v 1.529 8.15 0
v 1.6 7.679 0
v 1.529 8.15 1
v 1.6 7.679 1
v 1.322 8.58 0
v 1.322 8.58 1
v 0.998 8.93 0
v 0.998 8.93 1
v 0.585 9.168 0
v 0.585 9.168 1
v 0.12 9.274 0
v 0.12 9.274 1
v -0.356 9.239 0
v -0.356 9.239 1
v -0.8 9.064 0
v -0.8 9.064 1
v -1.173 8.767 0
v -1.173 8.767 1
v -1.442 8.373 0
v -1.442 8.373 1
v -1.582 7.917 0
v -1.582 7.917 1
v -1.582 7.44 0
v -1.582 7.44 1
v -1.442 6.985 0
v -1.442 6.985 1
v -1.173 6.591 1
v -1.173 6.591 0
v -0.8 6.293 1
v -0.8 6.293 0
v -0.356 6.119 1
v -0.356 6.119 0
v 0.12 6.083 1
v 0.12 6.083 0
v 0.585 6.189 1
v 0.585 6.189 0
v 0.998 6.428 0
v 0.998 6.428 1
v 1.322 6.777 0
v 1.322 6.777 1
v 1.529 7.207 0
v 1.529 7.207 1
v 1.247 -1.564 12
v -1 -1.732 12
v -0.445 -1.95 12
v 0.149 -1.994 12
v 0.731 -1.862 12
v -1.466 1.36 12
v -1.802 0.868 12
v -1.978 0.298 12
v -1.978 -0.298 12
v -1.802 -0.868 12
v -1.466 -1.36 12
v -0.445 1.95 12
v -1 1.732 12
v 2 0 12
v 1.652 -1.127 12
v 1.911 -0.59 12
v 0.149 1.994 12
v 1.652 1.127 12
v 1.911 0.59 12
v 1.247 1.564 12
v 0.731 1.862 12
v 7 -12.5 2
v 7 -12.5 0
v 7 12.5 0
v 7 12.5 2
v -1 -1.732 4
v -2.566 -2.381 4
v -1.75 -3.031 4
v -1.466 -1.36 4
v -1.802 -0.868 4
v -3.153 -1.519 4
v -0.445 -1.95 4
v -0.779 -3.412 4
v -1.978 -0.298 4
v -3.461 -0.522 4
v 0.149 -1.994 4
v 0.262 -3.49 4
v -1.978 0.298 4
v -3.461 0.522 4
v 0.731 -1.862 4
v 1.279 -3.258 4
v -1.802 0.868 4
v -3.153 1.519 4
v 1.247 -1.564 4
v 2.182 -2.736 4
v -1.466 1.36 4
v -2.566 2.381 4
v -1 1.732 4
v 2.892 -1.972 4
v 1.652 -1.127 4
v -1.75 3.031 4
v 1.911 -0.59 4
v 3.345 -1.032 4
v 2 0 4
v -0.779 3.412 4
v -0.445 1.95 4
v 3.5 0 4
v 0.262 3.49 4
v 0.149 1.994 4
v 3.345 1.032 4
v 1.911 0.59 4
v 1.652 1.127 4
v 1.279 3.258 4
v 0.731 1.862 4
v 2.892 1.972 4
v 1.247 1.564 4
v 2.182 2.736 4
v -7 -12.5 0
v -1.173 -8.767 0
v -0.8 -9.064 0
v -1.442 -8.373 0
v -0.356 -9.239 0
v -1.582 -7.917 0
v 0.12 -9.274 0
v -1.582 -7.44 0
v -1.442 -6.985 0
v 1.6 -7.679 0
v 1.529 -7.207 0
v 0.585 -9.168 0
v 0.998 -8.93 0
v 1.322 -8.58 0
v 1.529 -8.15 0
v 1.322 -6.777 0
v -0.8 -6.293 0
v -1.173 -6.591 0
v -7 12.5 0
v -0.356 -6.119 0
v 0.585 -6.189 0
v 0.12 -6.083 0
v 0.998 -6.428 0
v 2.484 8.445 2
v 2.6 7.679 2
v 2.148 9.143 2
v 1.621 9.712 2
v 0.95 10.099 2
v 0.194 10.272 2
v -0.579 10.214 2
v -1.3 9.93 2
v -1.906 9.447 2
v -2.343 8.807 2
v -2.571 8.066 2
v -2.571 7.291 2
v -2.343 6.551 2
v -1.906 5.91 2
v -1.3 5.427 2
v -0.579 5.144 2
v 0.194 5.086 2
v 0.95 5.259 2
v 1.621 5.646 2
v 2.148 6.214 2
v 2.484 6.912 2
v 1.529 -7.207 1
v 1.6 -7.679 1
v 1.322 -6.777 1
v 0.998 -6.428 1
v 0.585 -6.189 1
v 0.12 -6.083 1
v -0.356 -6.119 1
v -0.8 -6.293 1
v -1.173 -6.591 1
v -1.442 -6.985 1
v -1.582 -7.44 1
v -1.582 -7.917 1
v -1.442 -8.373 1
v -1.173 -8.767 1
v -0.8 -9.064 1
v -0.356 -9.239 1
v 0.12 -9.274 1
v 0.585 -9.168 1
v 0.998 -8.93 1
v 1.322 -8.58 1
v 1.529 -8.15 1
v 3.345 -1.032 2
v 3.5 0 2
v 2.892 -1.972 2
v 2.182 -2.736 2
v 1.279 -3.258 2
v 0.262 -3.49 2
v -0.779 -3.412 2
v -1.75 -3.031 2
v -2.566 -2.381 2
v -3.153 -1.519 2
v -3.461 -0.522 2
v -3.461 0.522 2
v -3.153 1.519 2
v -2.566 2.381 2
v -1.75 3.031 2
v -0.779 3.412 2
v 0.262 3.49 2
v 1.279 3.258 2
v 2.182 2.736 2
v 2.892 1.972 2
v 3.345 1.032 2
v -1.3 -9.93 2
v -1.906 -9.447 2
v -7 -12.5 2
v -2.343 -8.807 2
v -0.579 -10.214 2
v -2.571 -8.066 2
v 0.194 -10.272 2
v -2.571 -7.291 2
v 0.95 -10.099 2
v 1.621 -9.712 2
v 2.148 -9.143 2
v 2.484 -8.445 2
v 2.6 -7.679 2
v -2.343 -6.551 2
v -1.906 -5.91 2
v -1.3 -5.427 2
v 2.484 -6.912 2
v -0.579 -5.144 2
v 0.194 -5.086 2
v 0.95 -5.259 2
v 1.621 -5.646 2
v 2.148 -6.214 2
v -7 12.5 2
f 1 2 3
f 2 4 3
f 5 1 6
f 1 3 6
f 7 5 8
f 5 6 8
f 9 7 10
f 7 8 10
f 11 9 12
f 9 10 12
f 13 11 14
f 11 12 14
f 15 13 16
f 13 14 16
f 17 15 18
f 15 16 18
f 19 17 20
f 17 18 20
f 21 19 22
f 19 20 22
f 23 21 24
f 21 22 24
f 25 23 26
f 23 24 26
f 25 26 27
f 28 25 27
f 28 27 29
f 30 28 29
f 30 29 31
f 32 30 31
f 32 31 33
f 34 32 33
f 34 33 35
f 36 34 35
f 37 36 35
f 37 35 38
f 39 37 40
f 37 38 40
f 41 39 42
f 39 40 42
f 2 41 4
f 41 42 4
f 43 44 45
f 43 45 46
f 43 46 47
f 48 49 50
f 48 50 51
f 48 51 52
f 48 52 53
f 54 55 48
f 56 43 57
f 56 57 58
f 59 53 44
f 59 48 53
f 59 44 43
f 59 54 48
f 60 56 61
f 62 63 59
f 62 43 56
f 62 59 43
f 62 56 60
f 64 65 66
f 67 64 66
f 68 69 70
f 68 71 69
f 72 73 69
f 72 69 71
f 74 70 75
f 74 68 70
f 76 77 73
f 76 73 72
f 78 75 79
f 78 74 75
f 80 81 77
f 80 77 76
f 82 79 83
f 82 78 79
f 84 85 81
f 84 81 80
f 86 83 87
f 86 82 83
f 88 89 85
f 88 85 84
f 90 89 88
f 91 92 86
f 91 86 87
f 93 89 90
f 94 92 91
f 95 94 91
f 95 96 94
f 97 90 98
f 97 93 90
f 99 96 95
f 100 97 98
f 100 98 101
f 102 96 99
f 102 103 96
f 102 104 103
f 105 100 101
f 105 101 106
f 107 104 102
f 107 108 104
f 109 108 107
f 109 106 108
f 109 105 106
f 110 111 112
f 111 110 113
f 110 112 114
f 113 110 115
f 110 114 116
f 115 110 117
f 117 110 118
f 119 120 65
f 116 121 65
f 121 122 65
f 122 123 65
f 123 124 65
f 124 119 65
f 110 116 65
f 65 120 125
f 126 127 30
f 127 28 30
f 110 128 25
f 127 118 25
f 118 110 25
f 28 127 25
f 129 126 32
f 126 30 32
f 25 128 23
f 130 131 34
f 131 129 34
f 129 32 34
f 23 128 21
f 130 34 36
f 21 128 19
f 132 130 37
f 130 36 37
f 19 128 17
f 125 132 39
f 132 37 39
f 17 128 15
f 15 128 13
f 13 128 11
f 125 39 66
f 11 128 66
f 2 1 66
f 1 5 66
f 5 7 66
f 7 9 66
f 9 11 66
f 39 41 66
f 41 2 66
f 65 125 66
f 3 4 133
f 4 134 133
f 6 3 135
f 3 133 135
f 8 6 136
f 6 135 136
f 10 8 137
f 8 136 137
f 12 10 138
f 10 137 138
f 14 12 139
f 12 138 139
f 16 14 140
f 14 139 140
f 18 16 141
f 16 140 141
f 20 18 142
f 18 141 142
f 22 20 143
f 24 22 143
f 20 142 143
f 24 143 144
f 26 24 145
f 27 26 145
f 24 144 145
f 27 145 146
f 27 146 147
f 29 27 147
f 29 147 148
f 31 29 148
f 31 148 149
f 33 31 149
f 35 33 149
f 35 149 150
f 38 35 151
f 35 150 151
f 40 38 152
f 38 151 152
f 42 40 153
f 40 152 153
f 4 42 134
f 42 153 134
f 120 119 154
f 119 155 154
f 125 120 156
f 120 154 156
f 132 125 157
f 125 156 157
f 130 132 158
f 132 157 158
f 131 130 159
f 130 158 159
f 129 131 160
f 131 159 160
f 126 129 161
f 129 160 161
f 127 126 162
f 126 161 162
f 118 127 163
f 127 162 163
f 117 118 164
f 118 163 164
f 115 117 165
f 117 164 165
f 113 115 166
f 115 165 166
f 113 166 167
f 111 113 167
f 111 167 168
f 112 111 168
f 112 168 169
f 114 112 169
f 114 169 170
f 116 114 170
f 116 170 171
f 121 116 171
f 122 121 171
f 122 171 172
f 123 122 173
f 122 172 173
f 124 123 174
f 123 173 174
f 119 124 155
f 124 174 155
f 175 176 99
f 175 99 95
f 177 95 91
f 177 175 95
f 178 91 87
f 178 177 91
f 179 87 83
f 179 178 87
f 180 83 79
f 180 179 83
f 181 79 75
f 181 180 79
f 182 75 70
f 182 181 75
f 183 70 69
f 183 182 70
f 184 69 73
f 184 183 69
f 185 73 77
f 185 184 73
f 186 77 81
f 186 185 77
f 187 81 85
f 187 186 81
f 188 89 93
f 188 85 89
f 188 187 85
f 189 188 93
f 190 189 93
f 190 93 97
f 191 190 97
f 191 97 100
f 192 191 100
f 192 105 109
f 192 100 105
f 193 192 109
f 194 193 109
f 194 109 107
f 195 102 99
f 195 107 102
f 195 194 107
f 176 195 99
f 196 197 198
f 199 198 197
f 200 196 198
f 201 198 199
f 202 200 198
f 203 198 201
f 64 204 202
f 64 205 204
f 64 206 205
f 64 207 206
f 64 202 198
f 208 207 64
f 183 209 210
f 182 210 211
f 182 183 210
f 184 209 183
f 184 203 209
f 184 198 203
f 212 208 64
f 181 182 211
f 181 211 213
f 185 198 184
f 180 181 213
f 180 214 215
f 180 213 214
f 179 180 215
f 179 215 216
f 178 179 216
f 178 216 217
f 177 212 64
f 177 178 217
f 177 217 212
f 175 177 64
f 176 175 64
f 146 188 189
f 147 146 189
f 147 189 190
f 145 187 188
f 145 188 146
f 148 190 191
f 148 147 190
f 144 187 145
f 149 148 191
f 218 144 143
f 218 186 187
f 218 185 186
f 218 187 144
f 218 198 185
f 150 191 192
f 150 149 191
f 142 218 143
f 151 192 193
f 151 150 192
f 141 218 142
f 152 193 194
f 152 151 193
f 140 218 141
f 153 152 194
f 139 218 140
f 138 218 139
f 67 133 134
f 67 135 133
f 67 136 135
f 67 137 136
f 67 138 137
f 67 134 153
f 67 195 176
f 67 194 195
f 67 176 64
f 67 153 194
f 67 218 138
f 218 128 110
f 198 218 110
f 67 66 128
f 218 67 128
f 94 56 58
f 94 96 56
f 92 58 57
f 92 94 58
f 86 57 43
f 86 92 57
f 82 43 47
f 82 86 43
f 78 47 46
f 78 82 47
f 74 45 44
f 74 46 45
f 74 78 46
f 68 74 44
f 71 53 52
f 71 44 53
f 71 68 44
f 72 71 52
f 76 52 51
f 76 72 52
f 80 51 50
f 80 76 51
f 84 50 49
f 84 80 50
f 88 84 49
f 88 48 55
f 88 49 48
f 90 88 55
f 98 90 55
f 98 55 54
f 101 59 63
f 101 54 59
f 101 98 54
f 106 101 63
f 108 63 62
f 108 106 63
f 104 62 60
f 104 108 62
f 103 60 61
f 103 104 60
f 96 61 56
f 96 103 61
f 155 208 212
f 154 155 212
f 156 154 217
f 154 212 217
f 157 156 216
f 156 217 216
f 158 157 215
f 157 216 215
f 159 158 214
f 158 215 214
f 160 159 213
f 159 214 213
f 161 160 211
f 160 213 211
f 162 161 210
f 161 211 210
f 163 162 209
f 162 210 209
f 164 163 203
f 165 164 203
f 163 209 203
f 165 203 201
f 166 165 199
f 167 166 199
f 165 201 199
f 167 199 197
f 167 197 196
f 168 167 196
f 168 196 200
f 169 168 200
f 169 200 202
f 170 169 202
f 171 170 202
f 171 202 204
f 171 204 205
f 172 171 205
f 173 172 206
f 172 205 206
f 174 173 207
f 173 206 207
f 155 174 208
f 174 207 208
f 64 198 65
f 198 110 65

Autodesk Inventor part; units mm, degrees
ref_plane "YZ Plane" through (0, 0, 0) normal (1, 0, 0) x (0, 1, 0)
ref_plane "XZ Plane" through (0, 0, 0) normal (0, 1, 0) x (-1, 0, 0)
ref_plane "XY Plane" through (0, 0, 0) normal (0, 0, 1) x (1, 0, 0)
sketch "Sketch1" plane through (0, 0, 0) normal (0, 0, 1) x (1, 0, 0)
  line L0 (-7, -12.5) -> (7, -12.5)
  line L1 (7, -12.5) -> (7, 12.5)
  line L2 (7, 12.5) -> (-7, 12.5)
  line L3 (-7, 12.5) -> (-7, -12.5)
  line L4 (-7, -12.5) -> (7, 12.5) construction
  line L5 (7, -12.5) -> (-7, 12.5) construction
  point P0 (0, 0)
  dimension "d0" = 14
  dimension "d1" = 25
extrude "Extrusion1" add sketch "Sketch1" along normal blind 2
sketch "Sketch2" plane through (0, 0, 2) normal (0, 0, 1) x (1, 0, 0)
  circle A0 centre (0, 7.6788) radius 1.6
  line L0 (-7, 12.5) -> (-7, -12.5) construction
  line L1 (-7, 0) -> (7, 0) construction
  line L2 (7, -12.5) -> (7, 12.5) construction
  circle A1 centre (0, -7.6788) radius 1.6
  point P0 (0, 0)
  dimension "d4" = 3.2
extrude "Extrusion2" cut sketch "Sketch2" against normal blind 2
sketch "Sketch3" plane through (0, 0, 2) normal (0, 0, 1) x (1, 0, 0)
  circle A0 centre (0, 0) radius 2
  dimension "d7" = 4
extrude "Extrusion3" add sketch "Sketch3" along normal blind 10
sketch "Sketch4" plane through (0, 0, 2) normal (0, 0, 1) x (1, 0, 0)
  circle A0 centre (0, 0) radius 2 projected
  circle A1 centre (0, 0) radius 3.5
  dimension "d10" = 1.5
extrude "Extrusion4" add sketch "Sketch4" along normal blind 2
chamfer "Chamfer1" distance 1 angle 45 2 edges at (-1.6, -7.6788, 2) (-1.6, 7.6788, 2)
properties part number "BearingMount-ExtrusionBtm"
